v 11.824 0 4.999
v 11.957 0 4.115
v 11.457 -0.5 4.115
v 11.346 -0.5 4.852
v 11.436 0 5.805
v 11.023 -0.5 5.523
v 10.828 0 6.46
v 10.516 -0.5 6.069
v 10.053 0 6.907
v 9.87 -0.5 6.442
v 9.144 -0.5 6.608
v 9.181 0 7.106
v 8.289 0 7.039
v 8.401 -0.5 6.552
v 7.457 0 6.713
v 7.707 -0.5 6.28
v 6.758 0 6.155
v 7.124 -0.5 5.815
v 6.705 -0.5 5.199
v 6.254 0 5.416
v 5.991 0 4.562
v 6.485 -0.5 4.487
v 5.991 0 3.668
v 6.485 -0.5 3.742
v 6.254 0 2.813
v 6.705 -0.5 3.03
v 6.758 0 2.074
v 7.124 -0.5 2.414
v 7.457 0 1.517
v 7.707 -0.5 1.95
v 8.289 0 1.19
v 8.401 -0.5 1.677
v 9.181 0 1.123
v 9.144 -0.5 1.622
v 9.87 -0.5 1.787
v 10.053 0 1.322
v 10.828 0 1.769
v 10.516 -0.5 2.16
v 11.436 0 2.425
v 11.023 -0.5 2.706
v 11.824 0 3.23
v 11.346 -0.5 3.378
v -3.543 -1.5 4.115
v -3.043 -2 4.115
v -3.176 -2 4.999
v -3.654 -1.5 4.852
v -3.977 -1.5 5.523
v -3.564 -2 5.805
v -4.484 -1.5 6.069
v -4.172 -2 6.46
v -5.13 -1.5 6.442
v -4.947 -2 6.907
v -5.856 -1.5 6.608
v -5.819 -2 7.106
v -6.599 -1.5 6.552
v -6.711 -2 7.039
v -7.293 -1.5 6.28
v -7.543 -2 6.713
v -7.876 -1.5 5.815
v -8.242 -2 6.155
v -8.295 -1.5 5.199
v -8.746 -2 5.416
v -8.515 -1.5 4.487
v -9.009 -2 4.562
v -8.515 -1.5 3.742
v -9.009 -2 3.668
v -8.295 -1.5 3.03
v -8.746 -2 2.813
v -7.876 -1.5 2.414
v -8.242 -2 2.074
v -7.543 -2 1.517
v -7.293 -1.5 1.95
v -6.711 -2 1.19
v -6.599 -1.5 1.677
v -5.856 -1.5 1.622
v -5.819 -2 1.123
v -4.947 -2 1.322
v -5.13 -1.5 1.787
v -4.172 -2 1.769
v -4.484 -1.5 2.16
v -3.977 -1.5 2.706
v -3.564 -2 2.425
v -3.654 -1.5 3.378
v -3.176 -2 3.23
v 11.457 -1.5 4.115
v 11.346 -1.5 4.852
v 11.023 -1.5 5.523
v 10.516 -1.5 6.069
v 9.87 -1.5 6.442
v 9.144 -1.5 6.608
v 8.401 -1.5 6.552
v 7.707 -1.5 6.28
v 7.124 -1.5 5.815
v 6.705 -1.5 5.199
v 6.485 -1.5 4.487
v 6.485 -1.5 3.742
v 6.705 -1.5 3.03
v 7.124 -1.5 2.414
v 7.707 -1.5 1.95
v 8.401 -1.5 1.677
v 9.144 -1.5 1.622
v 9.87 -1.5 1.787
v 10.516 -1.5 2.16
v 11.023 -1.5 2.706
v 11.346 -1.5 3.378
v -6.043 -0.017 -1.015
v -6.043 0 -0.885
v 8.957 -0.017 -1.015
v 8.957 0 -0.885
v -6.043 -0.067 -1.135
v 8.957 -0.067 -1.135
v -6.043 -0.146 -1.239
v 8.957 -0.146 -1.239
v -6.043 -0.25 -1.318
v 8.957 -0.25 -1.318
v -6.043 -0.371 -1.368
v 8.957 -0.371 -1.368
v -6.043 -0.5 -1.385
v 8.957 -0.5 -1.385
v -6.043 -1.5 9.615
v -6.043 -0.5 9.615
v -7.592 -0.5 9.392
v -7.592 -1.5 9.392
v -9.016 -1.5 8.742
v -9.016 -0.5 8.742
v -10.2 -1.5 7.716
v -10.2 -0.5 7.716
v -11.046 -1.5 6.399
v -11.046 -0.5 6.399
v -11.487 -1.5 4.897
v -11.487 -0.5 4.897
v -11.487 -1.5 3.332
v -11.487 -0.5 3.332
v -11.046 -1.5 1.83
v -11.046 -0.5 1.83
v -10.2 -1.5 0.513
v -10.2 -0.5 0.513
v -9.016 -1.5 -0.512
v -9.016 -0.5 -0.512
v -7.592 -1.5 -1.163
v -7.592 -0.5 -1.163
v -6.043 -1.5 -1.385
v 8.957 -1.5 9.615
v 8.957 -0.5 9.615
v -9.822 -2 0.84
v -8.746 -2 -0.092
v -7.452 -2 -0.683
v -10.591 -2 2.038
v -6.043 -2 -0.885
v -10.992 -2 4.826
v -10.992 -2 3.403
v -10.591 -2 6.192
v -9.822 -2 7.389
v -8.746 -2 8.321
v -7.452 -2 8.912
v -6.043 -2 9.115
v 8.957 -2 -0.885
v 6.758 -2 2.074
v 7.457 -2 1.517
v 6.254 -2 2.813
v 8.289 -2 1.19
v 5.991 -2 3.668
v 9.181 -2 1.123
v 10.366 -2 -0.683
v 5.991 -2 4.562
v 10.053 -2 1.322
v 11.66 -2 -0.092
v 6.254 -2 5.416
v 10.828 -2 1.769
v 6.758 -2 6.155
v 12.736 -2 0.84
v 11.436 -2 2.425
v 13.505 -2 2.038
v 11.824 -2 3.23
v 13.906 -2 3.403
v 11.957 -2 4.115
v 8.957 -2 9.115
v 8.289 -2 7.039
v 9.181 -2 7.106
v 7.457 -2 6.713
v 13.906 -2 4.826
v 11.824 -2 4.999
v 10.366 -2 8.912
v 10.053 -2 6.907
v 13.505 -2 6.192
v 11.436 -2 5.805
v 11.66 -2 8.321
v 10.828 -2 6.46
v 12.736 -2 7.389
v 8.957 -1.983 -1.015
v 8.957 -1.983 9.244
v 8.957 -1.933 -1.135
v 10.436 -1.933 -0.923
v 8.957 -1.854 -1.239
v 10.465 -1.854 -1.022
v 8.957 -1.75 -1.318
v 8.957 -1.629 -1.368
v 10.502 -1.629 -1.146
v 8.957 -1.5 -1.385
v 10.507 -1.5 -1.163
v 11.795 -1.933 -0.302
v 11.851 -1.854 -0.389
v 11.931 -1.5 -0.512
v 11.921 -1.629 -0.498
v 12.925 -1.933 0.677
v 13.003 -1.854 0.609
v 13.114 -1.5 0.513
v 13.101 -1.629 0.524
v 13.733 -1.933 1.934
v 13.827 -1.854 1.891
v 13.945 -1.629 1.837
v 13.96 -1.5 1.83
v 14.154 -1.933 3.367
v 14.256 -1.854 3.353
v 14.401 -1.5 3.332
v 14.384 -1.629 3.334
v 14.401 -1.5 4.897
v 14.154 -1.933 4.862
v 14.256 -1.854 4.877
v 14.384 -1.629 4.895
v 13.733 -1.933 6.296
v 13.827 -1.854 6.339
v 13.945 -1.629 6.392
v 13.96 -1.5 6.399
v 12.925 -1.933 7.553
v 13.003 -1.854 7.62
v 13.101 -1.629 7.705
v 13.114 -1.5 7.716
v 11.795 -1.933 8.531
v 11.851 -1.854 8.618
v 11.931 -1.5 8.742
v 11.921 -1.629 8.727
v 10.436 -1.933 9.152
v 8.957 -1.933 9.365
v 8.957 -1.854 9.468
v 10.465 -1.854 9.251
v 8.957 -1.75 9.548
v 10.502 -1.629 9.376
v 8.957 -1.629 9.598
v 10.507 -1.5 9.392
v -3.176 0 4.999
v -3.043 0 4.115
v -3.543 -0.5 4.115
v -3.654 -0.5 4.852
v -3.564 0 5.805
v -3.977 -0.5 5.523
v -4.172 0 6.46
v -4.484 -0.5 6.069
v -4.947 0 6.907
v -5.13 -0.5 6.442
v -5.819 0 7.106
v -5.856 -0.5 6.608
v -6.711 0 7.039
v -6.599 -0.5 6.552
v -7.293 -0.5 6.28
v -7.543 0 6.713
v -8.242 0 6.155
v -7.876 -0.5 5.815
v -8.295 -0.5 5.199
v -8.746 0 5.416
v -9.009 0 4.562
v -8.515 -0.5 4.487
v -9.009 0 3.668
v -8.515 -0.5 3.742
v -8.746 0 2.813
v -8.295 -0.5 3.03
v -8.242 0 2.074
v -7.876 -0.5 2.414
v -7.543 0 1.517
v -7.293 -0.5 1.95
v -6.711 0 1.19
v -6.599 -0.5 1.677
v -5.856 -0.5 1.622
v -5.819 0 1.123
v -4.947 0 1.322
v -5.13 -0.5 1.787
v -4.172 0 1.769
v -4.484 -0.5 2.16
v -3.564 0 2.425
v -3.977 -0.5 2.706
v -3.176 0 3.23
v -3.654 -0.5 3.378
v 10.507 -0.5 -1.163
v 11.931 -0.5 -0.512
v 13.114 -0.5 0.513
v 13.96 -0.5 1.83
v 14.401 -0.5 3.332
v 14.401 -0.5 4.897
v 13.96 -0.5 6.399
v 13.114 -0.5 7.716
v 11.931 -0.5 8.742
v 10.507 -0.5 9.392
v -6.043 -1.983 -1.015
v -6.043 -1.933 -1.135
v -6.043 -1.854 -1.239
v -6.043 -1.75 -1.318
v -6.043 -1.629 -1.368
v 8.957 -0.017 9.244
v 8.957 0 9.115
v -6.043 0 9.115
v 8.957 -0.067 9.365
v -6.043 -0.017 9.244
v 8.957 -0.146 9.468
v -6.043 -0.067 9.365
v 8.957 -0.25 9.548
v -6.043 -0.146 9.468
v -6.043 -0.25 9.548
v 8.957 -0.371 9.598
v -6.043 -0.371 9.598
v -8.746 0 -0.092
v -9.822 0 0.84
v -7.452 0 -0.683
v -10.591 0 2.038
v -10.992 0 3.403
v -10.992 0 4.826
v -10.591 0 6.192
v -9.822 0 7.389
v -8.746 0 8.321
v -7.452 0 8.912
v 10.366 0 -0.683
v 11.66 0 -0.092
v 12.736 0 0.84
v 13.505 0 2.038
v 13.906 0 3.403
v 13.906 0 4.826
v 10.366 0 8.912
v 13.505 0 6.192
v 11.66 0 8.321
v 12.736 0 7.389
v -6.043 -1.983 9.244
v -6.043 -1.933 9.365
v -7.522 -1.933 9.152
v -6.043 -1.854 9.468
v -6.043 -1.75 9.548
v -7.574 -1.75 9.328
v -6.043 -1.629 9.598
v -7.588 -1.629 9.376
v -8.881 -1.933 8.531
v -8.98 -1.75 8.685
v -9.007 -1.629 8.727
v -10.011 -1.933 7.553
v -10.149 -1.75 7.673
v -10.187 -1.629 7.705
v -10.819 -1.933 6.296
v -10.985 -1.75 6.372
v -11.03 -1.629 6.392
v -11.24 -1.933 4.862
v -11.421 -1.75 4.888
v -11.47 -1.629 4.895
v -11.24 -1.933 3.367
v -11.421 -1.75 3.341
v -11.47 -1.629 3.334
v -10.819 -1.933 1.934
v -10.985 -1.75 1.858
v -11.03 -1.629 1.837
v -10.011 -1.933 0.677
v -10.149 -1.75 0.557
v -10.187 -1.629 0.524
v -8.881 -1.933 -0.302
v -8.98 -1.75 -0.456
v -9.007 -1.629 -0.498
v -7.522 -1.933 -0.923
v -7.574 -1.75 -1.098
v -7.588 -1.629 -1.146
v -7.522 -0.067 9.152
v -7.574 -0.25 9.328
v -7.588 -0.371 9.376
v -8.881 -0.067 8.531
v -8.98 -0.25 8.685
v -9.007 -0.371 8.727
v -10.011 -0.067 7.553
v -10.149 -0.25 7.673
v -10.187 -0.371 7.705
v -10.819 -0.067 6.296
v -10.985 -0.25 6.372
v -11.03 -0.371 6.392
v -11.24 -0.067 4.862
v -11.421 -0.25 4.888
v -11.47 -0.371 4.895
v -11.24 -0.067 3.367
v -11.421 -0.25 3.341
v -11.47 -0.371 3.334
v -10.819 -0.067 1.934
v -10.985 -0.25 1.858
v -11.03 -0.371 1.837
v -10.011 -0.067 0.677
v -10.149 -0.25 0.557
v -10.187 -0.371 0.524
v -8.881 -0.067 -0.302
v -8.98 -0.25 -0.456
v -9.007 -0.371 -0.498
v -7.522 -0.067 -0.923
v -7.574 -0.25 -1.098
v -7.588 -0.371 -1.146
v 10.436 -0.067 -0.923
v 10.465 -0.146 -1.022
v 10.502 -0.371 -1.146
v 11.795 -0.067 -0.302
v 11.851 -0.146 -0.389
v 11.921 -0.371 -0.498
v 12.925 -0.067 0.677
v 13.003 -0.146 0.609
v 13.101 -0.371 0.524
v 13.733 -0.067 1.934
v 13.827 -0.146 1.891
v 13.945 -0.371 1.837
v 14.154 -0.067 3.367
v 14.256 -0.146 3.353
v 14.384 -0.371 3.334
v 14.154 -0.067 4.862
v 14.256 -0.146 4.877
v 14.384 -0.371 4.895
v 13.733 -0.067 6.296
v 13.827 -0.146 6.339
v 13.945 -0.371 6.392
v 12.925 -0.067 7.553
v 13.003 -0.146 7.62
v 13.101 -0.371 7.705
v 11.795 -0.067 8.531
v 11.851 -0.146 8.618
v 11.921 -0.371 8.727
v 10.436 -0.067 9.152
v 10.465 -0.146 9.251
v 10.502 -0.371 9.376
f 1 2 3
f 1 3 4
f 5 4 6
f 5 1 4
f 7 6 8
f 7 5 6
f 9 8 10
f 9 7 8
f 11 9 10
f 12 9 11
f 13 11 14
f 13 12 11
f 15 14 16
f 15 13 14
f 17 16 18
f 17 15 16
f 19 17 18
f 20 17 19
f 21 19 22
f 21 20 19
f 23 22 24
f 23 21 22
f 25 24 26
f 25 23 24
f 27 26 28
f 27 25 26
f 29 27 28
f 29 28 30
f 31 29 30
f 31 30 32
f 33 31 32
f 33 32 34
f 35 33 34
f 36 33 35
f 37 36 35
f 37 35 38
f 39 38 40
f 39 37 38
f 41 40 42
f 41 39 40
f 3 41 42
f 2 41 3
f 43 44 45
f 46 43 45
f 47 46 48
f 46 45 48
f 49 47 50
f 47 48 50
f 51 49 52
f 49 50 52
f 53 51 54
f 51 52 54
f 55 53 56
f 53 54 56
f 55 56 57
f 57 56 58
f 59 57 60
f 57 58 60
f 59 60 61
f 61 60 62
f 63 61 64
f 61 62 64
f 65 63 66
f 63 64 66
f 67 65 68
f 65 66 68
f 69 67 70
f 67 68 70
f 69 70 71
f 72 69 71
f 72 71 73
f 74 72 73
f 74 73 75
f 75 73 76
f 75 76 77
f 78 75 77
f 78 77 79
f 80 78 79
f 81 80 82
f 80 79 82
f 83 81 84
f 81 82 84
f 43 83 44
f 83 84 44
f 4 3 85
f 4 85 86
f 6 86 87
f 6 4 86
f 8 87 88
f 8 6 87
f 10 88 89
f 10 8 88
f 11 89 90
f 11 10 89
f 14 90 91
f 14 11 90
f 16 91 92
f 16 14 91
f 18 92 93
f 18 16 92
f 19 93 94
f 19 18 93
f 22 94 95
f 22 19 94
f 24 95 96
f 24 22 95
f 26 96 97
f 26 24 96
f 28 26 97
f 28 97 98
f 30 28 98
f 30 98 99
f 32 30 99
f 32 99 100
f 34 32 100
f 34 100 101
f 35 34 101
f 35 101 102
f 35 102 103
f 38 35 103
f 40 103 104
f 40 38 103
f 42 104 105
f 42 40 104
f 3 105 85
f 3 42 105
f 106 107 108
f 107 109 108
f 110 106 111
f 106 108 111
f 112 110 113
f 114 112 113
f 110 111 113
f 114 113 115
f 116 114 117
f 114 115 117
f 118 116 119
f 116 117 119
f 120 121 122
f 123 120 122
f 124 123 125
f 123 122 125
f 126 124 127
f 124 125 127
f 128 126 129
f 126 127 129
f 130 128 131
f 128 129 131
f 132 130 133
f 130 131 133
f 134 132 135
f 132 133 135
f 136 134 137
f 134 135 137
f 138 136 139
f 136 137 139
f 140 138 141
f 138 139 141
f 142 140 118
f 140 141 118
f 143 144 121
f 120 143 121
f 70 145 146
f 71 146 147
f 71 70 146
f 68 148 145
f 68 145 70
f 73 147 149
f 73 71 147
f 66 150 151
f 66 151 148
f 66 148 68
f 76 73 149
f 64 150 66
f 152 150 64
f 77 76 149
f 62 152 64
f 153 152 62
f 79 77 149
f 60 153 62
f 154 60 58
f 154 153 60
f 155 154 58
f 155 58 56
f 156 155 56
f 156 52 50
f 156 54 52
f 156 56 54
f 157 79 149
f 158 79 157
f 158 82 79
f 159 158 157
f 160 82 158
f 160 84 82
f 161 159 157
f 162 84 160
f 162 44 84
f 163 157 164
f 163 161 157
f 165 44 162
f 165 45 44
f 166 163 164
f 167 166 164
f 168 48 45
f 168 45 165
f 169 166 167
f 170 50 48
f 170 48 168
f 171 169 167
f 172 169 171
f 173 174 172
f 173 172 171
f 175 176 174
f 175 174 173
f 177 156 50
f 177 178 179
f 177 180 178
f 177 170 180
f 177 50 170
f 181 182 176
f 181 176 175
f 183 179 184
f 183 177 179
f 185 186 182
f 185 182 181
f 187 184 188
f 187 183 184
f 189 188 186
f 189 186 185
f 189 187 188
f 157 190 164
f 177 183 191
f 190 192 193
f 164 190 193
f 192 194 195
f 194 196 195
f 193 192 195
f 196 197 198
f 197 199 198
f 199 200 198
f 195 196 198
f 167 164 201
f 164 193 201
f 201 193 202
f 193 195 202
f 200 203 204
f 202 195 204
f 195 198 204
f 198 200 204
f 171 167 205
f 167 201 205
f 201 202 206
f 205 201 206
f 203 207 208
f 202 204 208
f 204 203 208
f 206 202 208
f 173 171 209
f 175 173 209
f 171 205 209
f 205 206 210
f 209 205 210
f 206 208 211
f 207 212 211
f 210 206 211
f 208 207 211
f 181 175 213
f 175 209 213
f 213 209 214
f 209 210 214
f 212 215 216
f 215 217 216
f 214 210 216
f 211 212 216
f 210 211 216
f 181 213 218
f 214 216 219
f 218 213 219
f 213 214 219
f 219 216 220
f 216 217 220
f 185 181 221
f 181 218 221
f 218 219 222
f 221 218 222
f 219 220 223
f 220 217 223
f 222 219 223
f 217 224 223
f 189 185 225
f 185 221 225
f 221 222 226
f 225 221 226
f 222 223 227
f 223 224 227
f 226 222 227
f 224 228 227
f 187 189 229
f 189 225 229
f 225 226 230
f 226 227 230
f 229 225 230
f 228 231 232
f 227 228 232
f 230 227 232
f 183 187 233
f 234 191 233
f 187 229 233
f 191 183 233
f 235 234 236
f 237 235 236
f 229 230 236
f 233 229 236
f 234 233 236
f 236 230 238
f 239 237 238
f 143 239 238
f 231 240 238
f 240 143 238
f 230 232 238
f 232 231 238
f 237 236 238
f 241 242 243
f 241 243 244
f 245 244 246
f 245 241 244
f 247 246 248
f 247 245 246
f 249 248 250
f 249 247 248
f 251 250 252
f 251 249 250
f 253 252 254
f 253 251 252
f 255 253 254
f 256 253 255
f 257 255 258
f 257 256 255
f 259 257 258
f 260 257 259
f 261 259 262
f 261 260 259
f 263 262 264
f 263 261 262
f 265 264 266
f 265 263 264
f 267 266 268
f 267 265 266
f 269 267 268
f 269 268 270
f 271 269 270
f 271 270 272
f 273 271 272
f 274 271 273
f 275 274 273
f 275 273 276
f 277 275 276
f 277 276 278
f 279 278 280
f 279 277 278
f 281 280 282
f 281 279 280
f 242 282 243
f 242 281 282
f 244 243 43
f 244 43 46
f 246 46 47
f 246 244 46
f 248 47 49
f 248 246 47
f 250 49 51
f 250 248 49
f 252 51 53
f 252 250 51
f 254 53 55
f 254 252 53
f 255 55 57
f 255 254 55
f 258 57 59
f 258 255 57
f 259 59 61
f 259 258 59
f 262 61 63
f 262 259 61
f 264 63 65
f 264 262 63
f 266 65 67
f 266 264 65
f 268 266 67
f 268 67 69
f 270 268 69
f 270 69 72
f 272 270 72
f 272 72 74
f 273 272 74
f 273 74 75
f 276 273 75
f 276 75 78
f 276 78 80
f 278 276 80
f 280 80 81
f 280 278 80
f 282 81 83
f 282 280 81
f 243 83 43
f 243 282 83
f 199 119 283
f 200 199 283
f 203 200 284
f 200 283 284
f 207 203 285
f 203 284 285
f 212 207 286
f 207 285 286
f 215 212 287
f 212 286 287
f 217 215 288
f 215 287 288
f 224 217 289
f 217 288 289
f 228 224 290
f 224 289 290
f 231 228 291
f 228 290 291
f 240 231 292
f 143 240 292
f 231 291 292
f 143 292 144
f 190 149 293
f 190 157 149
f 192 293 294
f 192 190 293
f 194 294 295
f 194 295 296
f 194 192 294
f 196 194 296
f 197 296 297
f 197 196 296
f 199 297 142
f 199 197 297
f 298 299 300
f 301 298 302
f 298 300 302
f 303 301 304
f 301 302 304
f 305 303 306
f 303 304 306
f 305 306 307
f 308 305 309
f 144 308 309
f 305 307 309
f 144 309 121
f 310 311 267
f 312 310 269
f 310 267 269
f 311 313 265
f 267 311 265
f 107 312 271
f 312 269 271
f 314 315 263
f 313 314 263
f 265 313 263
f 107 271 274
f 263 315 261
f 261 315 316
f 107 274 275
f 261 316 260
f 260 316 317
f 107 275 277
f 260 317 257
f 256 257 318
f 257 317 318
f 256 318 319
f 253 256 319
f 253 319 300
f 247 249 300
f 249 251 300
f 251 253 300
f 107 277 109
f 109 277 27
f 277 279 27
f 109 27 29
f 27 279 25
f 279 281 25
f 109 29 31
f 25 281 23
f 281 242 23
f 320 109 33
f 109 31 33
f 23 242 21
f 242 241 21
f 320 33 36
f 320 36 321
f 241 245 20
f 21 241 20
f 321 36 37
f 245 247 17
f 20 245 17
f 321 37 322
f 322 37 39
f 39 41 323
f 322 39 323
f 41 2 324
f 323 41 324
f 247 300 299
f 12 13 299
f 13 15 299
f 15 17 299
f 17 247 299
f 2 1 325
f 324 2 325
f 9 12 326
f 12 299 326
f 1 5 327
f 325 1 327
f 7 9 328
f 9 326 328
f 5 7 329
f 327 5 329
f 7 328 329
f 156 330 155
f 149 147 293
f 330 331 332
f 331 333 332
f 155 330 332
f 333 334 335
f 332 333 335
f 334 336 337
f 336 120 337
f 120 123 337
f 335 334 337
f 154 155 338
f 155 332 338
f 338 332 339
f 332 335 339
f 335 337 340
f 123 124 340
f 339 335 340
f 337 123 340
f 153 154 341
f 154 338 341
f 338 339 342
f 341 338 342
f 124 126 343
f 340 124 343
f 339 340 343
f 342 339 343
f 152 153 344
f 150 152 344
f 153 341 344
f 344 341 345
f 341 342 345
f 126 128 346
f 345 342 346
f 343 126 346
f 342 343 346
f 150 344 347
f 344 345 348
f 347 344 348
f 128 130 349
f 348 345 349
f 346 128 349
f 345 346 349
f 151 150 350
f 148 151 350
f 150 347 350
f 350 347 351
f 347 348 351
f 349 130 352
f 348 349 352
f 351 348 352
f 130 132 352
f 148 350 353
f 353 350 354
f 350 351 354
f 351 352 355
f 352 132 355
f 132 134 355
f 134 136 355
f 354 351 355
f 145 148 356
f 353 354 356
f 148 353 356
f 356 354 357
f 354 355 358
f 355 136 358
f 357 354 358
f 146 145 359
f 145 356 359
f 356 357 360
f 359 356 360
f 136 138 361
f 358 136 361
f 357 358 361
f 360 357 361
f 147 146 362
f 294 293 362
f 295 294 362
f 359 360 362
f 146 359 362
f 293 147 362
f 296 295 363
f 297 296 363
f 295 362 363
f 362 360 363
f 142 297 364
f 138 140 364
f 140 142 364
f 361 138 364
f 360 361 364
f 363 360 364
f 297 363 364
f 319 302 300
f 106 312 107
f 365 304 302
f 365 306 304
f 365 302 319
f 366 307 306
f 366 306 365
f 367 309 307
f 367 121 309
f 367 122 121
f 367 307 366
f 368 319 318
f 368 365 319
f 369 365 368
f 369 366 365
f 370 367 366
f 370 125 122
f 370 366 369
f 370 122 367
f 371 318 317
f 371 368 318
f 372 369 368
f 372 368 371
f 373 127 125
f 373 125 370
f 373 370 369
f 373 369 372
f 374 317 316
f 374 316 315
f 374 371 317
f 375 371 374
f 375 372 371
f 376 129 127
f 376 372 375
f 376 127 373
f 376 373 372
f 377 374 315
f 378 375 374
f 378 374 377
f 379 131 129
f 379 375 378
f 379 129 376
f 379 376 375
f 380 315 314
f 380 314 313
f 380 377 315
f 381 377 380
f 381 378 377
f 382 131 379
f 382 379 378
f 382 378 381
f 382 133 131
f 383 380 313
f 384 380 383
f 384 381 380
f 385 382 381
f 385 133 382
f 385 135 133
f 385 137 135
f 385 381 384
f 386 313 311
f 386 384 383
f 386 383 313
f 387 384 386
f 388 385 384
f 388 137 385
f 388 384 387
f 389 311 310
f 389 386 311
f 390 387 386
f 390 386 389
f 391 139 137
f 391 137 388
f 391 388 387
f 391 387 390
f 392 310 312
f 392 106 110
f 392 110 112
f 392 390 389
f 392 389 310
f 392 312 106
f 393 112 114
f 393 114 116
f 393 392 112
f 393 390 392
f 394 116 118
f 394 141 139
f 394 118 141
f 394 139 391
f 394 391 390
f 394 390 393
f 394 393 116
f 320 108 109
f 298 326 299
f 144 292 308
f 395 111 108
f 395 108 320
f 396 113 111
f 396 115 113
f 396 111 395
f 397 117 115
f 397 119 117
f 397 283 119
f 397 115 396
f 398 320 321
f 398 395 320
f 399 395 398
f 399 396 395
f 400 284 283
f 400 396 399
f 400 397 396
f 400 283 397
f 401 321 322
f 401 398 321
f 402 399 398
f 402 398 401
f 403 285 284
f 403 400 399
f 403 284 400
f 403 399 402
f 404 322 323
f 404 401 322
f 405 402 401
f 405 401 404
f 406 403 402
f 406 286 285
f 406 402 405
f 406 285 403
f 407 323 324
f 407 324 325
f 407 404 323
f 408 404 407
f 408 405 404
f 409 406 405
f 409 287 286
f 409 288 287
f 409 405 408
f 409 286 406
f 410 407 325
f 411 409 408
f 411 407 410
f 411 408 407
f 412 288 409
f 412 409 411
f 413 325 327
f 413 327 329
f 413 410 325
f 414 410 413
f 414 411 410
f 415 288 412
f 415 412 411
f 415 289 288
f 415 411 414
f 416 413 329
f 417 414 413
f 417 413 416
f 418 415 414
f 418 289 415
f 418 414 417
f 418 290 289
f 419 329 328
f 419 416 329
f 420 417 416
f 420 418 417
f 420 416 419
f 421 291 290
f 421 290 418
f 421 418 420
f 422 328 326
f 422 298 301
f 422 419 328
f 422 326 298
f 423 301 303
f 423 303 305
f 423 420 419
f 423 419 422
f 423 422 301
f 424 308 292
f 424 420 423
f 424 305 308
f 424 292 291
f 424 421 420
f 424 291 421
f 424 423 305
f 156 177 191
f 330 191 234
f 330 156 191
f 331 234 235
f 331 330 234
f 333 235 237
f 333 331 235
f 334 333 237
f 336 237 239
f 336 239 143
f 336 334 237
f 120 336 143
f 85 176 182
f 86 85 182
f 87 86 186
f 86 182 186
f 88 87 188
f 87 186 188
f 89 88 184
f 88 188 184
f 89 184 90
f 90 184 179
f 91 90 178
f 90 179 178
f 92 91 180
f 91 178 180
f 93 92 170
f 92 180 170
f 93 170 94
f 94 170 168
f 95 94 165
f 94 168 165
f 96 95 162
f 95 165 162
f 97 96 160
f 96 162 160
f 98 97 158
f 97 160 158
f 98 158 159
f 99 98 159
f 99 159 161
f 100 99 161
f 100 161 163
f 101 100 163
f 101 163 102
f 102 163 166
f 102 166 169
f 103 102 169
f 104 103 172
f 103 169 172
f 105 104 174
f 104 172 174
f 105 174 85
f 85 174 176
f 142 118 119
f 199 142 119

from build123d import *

# Parameters (mm, degrees)
F0_R     = 2.5
F1_DEPTH = 2
F2_SIZE  = 0.5
F3_R     = 0.5


with BuildPart() as f1:
    # F0 (on Front) → F1 (new body)
    with BuildSketch(Plane.XZ):
        with BuildLine():
            Line((8.957038, 9.614641), (-6.042962, 9.614641))
            ThreePointArc((-6.042962, 9.614641), (-11.542962, 4.114641), (-6.042962, -1.385359))
            Line((-6.042962, -1.385359), (8.957038, -1.385359))
            ThreePointArc((8.957038, -1.385359), (14.457038, 4.114641), (8.957038, 9.614641))
        make_face()
        with Locations((-6.042962, 4.114641)):
            Circle(F0_R, mode=Mode.SUBTRACT)
        with Locations((8.957038, 4.114641)):
            Circle(F0_R, mode=Mode.SUBTRACT)
    extrude(amount=F1_DEPTH)

    # F2
    f2_edges = [f1.edges().sort_by_distance(p)[0] for p in [
        (-8.542962, -2, 4.114641),
        (6.457038, -2, 4.114641),
        (-8.542962, 0, 4.114641),
        (6.457038, 0, 4.114641),
    ]]
    chamfer(f2_edges, length=F2_SIZE)

    # F3
    f3_edges = [f1.edges().sort_by_distance(p)[0] for p in [
        (1.457038, -2, -1.385359),
        (1.457038, 0, -1.385359),
    ]]
    fillet(f3_edges, radius=F3_R)


solid = f1.part
